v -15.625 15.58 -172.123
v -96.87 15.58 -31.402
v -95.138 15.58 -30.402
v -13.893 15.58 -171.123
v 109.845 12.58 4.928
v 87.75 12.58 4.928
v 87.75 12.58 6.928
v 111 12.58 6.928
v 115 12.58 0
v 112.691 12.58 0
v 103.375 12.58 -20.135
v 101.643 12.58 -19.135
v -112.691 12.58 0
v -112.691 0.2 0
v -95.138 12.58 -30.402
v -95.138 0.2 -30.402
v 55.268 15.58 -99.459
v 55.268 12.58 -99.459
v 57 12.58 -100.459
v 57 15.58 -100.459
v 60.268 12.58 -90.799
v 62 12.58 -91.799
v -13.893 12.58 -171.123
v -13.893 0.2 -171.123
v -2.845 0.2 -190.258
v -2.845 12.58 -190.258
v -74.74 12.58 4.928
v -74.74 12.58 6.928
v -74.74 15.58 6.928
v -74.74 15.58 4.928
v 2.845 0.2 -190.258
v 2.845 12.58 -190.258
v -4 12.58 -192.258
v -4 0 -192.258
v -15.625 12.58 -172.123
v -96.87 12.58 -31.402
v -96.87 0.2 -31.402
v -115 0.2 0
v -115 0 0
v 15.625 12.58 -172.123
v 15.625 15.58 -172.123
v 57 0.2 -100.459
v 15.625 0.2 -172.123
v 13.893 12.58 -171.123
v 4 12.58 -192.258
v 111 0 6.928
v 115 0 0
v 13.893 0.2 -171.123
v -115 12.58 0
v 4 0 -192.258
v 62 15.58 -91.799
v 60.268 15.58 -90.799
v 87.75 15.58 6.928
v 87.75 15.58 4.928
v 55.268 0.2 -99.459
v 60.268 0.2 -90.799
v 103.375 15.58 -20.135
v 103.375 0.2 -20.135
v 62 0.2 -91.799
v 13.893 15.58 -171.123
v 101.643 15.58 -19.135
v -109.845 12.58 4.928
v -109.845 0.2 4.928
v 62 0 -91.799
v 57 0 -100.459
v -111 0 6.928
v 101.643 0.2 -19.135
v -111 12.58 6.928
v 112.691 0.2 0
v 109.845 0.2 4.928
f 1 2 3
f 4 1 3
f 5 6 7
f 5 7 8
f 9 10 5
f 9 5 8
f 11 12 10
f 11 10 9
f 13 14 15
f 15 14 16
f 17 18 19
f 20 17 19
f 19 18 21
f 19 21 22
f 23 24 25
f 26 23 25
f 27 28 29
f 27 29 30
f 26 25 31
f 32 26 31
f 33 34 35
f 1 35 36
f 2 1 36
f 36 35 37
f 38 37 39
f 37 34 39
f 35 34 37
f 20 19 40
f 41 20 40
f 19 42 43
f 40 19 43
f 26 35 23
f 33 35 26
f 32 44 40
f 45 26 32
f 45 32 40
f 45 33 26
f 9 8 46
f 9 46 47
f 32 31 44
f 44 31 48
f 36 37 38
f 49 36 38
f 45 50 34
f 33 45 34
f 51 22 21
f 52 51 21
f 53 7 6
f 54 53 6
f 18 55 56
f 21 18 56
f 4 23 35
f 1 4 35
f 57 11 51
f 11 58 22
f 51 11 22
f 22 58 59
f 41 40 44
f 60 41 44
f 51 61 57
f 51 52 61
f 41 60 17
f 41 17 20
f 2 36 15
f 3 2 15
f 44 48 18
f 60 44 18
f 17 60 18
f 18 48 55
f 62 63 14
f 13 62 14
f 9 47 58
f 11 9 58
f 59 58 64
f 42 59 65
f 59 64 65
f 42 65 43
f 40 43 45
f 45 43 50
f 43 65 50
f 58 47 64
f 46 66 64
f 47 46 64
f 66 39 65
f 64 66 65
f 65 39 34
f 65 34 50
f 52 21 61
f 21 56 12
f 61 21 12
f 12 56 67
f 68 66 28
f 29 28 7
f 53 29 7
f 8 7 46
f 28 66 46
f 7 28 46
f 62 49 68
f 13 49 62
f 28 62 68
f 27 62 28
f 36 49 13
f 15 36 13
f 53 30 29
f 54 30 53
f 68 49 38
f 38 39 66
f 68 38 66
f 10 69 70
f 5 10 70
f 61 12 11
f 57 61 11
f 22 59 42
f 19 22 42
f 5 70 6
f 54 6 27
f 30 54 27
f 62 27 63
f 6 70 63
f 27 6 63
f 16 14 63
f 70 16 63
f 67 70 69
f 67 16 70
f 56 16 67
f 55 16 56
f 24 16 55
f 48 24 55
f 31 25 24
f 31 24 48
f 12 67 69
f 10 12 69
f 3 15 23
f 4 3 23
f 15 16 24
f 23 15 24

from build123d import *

# Parameters (mm, degrees)
BOSS_EXTRUDE1_DEPTH = 0.2
BOSS_EXTRUDE2_DEPTH = 12.58
SKETCH1_4_W         = 162.49
SKETCH1_4_H         = 2
BOSS_EXTRUDE3_DEPTH = 15.58


# Read off the part's stored shape, not the designer's step: Boss-Extrude2
with BuildPart() as part:
    # Sketch1 → Boss-Extrude1 (new body)
    with BuildSketch(Plane(origin=(0, 0, 0), x_dir=(1, 0, 0), z_dir=(0, 1, 0))):
        Polygon((-115, 0), (-111, -6.92820323), (111, -6.92820323), (115, 0), (15.625, 172.122549002), (13.892949192, 171.122549002), (2.845299462, 190.25763964), (-2.845299462, 190.25763964), (-13.892949192, 171.122549002), (-15.625, 172.122549002), align=None)
    extrude(amount=BOSS_EXTRUDE1_DEPTH)

    # Boss-Extrude2 outline → Boss-Extrude2 (add)
    with BuildSketch(Plane(origin=(0, 0, 0), x_dir=(1, 0, 0), z_dir=(0, 1, 0))):
        Polygon((15.625, 172.122549002), (4, 192.25763964), (-4, 192.25763964), (-15.625, 172.122549002), (-13.892949192, 171.122549002), (-2.845299462, 190.25763964), (2.845299462, 190.25763964), (13.892949192, 171.122549002), align=None)
        Polygon((62, 91.798692801), (57, 100.458946839), (55.267949192, 99.458946839), (60.267949192, 90.798692801), align=None)
        Polygon((-95.137949192, 30.402081141), (-96.87, 31.402081141), (-115, 0), (-111, -6.92820323), (-74.74, -6.92820323), (-74.74, -4.92820323), (-109.845299462, -4.92820323), (-112.690598923, 0), align=None)
        Polygon((115, 0), (103.375, 20.135090638), (101.642949192, 19.135090638), (112.690598923, 0), (109.845299462, -4.92820323), (87.75, -4.92820323), (87.75, -6.92820323), (111, -6.92820323), align=None)
    extrude(amount=BOSS_EXTRUDE2_DEPTH)

    # Sketch1<4> → Boss-Extrude3 (add)
    with BuildSketch(Plane(origin=(0, 0, 0), x_dir=(1, 0, 0), z_dir=(0, 1, 0))):
        Polygon((-15.625, 172.122549002), (-96.87, 31.402081141), (-95.137949192, 30.402081141), (-13.892949192, 171.122549002), align=None)
        with Locations((6.505, -5.92820323)):
            Rectangle(SKETCH1_4_W, SKETCH1_4_H)
        Polygon((57, 100.458946839), (15.625, 172.122549002), (13.892949192, 171.122549002), (55.267949192, 99.458946839), align=None)
        Polygon((101.642949192, 19.135090638), (103.375, 20.135090638), (62, 91.798692801), (60.267949192, 90.798692801), align=None)
    extrude(amount=BOSS_EXTRUDE3_DEPTH)


solid = part.part
